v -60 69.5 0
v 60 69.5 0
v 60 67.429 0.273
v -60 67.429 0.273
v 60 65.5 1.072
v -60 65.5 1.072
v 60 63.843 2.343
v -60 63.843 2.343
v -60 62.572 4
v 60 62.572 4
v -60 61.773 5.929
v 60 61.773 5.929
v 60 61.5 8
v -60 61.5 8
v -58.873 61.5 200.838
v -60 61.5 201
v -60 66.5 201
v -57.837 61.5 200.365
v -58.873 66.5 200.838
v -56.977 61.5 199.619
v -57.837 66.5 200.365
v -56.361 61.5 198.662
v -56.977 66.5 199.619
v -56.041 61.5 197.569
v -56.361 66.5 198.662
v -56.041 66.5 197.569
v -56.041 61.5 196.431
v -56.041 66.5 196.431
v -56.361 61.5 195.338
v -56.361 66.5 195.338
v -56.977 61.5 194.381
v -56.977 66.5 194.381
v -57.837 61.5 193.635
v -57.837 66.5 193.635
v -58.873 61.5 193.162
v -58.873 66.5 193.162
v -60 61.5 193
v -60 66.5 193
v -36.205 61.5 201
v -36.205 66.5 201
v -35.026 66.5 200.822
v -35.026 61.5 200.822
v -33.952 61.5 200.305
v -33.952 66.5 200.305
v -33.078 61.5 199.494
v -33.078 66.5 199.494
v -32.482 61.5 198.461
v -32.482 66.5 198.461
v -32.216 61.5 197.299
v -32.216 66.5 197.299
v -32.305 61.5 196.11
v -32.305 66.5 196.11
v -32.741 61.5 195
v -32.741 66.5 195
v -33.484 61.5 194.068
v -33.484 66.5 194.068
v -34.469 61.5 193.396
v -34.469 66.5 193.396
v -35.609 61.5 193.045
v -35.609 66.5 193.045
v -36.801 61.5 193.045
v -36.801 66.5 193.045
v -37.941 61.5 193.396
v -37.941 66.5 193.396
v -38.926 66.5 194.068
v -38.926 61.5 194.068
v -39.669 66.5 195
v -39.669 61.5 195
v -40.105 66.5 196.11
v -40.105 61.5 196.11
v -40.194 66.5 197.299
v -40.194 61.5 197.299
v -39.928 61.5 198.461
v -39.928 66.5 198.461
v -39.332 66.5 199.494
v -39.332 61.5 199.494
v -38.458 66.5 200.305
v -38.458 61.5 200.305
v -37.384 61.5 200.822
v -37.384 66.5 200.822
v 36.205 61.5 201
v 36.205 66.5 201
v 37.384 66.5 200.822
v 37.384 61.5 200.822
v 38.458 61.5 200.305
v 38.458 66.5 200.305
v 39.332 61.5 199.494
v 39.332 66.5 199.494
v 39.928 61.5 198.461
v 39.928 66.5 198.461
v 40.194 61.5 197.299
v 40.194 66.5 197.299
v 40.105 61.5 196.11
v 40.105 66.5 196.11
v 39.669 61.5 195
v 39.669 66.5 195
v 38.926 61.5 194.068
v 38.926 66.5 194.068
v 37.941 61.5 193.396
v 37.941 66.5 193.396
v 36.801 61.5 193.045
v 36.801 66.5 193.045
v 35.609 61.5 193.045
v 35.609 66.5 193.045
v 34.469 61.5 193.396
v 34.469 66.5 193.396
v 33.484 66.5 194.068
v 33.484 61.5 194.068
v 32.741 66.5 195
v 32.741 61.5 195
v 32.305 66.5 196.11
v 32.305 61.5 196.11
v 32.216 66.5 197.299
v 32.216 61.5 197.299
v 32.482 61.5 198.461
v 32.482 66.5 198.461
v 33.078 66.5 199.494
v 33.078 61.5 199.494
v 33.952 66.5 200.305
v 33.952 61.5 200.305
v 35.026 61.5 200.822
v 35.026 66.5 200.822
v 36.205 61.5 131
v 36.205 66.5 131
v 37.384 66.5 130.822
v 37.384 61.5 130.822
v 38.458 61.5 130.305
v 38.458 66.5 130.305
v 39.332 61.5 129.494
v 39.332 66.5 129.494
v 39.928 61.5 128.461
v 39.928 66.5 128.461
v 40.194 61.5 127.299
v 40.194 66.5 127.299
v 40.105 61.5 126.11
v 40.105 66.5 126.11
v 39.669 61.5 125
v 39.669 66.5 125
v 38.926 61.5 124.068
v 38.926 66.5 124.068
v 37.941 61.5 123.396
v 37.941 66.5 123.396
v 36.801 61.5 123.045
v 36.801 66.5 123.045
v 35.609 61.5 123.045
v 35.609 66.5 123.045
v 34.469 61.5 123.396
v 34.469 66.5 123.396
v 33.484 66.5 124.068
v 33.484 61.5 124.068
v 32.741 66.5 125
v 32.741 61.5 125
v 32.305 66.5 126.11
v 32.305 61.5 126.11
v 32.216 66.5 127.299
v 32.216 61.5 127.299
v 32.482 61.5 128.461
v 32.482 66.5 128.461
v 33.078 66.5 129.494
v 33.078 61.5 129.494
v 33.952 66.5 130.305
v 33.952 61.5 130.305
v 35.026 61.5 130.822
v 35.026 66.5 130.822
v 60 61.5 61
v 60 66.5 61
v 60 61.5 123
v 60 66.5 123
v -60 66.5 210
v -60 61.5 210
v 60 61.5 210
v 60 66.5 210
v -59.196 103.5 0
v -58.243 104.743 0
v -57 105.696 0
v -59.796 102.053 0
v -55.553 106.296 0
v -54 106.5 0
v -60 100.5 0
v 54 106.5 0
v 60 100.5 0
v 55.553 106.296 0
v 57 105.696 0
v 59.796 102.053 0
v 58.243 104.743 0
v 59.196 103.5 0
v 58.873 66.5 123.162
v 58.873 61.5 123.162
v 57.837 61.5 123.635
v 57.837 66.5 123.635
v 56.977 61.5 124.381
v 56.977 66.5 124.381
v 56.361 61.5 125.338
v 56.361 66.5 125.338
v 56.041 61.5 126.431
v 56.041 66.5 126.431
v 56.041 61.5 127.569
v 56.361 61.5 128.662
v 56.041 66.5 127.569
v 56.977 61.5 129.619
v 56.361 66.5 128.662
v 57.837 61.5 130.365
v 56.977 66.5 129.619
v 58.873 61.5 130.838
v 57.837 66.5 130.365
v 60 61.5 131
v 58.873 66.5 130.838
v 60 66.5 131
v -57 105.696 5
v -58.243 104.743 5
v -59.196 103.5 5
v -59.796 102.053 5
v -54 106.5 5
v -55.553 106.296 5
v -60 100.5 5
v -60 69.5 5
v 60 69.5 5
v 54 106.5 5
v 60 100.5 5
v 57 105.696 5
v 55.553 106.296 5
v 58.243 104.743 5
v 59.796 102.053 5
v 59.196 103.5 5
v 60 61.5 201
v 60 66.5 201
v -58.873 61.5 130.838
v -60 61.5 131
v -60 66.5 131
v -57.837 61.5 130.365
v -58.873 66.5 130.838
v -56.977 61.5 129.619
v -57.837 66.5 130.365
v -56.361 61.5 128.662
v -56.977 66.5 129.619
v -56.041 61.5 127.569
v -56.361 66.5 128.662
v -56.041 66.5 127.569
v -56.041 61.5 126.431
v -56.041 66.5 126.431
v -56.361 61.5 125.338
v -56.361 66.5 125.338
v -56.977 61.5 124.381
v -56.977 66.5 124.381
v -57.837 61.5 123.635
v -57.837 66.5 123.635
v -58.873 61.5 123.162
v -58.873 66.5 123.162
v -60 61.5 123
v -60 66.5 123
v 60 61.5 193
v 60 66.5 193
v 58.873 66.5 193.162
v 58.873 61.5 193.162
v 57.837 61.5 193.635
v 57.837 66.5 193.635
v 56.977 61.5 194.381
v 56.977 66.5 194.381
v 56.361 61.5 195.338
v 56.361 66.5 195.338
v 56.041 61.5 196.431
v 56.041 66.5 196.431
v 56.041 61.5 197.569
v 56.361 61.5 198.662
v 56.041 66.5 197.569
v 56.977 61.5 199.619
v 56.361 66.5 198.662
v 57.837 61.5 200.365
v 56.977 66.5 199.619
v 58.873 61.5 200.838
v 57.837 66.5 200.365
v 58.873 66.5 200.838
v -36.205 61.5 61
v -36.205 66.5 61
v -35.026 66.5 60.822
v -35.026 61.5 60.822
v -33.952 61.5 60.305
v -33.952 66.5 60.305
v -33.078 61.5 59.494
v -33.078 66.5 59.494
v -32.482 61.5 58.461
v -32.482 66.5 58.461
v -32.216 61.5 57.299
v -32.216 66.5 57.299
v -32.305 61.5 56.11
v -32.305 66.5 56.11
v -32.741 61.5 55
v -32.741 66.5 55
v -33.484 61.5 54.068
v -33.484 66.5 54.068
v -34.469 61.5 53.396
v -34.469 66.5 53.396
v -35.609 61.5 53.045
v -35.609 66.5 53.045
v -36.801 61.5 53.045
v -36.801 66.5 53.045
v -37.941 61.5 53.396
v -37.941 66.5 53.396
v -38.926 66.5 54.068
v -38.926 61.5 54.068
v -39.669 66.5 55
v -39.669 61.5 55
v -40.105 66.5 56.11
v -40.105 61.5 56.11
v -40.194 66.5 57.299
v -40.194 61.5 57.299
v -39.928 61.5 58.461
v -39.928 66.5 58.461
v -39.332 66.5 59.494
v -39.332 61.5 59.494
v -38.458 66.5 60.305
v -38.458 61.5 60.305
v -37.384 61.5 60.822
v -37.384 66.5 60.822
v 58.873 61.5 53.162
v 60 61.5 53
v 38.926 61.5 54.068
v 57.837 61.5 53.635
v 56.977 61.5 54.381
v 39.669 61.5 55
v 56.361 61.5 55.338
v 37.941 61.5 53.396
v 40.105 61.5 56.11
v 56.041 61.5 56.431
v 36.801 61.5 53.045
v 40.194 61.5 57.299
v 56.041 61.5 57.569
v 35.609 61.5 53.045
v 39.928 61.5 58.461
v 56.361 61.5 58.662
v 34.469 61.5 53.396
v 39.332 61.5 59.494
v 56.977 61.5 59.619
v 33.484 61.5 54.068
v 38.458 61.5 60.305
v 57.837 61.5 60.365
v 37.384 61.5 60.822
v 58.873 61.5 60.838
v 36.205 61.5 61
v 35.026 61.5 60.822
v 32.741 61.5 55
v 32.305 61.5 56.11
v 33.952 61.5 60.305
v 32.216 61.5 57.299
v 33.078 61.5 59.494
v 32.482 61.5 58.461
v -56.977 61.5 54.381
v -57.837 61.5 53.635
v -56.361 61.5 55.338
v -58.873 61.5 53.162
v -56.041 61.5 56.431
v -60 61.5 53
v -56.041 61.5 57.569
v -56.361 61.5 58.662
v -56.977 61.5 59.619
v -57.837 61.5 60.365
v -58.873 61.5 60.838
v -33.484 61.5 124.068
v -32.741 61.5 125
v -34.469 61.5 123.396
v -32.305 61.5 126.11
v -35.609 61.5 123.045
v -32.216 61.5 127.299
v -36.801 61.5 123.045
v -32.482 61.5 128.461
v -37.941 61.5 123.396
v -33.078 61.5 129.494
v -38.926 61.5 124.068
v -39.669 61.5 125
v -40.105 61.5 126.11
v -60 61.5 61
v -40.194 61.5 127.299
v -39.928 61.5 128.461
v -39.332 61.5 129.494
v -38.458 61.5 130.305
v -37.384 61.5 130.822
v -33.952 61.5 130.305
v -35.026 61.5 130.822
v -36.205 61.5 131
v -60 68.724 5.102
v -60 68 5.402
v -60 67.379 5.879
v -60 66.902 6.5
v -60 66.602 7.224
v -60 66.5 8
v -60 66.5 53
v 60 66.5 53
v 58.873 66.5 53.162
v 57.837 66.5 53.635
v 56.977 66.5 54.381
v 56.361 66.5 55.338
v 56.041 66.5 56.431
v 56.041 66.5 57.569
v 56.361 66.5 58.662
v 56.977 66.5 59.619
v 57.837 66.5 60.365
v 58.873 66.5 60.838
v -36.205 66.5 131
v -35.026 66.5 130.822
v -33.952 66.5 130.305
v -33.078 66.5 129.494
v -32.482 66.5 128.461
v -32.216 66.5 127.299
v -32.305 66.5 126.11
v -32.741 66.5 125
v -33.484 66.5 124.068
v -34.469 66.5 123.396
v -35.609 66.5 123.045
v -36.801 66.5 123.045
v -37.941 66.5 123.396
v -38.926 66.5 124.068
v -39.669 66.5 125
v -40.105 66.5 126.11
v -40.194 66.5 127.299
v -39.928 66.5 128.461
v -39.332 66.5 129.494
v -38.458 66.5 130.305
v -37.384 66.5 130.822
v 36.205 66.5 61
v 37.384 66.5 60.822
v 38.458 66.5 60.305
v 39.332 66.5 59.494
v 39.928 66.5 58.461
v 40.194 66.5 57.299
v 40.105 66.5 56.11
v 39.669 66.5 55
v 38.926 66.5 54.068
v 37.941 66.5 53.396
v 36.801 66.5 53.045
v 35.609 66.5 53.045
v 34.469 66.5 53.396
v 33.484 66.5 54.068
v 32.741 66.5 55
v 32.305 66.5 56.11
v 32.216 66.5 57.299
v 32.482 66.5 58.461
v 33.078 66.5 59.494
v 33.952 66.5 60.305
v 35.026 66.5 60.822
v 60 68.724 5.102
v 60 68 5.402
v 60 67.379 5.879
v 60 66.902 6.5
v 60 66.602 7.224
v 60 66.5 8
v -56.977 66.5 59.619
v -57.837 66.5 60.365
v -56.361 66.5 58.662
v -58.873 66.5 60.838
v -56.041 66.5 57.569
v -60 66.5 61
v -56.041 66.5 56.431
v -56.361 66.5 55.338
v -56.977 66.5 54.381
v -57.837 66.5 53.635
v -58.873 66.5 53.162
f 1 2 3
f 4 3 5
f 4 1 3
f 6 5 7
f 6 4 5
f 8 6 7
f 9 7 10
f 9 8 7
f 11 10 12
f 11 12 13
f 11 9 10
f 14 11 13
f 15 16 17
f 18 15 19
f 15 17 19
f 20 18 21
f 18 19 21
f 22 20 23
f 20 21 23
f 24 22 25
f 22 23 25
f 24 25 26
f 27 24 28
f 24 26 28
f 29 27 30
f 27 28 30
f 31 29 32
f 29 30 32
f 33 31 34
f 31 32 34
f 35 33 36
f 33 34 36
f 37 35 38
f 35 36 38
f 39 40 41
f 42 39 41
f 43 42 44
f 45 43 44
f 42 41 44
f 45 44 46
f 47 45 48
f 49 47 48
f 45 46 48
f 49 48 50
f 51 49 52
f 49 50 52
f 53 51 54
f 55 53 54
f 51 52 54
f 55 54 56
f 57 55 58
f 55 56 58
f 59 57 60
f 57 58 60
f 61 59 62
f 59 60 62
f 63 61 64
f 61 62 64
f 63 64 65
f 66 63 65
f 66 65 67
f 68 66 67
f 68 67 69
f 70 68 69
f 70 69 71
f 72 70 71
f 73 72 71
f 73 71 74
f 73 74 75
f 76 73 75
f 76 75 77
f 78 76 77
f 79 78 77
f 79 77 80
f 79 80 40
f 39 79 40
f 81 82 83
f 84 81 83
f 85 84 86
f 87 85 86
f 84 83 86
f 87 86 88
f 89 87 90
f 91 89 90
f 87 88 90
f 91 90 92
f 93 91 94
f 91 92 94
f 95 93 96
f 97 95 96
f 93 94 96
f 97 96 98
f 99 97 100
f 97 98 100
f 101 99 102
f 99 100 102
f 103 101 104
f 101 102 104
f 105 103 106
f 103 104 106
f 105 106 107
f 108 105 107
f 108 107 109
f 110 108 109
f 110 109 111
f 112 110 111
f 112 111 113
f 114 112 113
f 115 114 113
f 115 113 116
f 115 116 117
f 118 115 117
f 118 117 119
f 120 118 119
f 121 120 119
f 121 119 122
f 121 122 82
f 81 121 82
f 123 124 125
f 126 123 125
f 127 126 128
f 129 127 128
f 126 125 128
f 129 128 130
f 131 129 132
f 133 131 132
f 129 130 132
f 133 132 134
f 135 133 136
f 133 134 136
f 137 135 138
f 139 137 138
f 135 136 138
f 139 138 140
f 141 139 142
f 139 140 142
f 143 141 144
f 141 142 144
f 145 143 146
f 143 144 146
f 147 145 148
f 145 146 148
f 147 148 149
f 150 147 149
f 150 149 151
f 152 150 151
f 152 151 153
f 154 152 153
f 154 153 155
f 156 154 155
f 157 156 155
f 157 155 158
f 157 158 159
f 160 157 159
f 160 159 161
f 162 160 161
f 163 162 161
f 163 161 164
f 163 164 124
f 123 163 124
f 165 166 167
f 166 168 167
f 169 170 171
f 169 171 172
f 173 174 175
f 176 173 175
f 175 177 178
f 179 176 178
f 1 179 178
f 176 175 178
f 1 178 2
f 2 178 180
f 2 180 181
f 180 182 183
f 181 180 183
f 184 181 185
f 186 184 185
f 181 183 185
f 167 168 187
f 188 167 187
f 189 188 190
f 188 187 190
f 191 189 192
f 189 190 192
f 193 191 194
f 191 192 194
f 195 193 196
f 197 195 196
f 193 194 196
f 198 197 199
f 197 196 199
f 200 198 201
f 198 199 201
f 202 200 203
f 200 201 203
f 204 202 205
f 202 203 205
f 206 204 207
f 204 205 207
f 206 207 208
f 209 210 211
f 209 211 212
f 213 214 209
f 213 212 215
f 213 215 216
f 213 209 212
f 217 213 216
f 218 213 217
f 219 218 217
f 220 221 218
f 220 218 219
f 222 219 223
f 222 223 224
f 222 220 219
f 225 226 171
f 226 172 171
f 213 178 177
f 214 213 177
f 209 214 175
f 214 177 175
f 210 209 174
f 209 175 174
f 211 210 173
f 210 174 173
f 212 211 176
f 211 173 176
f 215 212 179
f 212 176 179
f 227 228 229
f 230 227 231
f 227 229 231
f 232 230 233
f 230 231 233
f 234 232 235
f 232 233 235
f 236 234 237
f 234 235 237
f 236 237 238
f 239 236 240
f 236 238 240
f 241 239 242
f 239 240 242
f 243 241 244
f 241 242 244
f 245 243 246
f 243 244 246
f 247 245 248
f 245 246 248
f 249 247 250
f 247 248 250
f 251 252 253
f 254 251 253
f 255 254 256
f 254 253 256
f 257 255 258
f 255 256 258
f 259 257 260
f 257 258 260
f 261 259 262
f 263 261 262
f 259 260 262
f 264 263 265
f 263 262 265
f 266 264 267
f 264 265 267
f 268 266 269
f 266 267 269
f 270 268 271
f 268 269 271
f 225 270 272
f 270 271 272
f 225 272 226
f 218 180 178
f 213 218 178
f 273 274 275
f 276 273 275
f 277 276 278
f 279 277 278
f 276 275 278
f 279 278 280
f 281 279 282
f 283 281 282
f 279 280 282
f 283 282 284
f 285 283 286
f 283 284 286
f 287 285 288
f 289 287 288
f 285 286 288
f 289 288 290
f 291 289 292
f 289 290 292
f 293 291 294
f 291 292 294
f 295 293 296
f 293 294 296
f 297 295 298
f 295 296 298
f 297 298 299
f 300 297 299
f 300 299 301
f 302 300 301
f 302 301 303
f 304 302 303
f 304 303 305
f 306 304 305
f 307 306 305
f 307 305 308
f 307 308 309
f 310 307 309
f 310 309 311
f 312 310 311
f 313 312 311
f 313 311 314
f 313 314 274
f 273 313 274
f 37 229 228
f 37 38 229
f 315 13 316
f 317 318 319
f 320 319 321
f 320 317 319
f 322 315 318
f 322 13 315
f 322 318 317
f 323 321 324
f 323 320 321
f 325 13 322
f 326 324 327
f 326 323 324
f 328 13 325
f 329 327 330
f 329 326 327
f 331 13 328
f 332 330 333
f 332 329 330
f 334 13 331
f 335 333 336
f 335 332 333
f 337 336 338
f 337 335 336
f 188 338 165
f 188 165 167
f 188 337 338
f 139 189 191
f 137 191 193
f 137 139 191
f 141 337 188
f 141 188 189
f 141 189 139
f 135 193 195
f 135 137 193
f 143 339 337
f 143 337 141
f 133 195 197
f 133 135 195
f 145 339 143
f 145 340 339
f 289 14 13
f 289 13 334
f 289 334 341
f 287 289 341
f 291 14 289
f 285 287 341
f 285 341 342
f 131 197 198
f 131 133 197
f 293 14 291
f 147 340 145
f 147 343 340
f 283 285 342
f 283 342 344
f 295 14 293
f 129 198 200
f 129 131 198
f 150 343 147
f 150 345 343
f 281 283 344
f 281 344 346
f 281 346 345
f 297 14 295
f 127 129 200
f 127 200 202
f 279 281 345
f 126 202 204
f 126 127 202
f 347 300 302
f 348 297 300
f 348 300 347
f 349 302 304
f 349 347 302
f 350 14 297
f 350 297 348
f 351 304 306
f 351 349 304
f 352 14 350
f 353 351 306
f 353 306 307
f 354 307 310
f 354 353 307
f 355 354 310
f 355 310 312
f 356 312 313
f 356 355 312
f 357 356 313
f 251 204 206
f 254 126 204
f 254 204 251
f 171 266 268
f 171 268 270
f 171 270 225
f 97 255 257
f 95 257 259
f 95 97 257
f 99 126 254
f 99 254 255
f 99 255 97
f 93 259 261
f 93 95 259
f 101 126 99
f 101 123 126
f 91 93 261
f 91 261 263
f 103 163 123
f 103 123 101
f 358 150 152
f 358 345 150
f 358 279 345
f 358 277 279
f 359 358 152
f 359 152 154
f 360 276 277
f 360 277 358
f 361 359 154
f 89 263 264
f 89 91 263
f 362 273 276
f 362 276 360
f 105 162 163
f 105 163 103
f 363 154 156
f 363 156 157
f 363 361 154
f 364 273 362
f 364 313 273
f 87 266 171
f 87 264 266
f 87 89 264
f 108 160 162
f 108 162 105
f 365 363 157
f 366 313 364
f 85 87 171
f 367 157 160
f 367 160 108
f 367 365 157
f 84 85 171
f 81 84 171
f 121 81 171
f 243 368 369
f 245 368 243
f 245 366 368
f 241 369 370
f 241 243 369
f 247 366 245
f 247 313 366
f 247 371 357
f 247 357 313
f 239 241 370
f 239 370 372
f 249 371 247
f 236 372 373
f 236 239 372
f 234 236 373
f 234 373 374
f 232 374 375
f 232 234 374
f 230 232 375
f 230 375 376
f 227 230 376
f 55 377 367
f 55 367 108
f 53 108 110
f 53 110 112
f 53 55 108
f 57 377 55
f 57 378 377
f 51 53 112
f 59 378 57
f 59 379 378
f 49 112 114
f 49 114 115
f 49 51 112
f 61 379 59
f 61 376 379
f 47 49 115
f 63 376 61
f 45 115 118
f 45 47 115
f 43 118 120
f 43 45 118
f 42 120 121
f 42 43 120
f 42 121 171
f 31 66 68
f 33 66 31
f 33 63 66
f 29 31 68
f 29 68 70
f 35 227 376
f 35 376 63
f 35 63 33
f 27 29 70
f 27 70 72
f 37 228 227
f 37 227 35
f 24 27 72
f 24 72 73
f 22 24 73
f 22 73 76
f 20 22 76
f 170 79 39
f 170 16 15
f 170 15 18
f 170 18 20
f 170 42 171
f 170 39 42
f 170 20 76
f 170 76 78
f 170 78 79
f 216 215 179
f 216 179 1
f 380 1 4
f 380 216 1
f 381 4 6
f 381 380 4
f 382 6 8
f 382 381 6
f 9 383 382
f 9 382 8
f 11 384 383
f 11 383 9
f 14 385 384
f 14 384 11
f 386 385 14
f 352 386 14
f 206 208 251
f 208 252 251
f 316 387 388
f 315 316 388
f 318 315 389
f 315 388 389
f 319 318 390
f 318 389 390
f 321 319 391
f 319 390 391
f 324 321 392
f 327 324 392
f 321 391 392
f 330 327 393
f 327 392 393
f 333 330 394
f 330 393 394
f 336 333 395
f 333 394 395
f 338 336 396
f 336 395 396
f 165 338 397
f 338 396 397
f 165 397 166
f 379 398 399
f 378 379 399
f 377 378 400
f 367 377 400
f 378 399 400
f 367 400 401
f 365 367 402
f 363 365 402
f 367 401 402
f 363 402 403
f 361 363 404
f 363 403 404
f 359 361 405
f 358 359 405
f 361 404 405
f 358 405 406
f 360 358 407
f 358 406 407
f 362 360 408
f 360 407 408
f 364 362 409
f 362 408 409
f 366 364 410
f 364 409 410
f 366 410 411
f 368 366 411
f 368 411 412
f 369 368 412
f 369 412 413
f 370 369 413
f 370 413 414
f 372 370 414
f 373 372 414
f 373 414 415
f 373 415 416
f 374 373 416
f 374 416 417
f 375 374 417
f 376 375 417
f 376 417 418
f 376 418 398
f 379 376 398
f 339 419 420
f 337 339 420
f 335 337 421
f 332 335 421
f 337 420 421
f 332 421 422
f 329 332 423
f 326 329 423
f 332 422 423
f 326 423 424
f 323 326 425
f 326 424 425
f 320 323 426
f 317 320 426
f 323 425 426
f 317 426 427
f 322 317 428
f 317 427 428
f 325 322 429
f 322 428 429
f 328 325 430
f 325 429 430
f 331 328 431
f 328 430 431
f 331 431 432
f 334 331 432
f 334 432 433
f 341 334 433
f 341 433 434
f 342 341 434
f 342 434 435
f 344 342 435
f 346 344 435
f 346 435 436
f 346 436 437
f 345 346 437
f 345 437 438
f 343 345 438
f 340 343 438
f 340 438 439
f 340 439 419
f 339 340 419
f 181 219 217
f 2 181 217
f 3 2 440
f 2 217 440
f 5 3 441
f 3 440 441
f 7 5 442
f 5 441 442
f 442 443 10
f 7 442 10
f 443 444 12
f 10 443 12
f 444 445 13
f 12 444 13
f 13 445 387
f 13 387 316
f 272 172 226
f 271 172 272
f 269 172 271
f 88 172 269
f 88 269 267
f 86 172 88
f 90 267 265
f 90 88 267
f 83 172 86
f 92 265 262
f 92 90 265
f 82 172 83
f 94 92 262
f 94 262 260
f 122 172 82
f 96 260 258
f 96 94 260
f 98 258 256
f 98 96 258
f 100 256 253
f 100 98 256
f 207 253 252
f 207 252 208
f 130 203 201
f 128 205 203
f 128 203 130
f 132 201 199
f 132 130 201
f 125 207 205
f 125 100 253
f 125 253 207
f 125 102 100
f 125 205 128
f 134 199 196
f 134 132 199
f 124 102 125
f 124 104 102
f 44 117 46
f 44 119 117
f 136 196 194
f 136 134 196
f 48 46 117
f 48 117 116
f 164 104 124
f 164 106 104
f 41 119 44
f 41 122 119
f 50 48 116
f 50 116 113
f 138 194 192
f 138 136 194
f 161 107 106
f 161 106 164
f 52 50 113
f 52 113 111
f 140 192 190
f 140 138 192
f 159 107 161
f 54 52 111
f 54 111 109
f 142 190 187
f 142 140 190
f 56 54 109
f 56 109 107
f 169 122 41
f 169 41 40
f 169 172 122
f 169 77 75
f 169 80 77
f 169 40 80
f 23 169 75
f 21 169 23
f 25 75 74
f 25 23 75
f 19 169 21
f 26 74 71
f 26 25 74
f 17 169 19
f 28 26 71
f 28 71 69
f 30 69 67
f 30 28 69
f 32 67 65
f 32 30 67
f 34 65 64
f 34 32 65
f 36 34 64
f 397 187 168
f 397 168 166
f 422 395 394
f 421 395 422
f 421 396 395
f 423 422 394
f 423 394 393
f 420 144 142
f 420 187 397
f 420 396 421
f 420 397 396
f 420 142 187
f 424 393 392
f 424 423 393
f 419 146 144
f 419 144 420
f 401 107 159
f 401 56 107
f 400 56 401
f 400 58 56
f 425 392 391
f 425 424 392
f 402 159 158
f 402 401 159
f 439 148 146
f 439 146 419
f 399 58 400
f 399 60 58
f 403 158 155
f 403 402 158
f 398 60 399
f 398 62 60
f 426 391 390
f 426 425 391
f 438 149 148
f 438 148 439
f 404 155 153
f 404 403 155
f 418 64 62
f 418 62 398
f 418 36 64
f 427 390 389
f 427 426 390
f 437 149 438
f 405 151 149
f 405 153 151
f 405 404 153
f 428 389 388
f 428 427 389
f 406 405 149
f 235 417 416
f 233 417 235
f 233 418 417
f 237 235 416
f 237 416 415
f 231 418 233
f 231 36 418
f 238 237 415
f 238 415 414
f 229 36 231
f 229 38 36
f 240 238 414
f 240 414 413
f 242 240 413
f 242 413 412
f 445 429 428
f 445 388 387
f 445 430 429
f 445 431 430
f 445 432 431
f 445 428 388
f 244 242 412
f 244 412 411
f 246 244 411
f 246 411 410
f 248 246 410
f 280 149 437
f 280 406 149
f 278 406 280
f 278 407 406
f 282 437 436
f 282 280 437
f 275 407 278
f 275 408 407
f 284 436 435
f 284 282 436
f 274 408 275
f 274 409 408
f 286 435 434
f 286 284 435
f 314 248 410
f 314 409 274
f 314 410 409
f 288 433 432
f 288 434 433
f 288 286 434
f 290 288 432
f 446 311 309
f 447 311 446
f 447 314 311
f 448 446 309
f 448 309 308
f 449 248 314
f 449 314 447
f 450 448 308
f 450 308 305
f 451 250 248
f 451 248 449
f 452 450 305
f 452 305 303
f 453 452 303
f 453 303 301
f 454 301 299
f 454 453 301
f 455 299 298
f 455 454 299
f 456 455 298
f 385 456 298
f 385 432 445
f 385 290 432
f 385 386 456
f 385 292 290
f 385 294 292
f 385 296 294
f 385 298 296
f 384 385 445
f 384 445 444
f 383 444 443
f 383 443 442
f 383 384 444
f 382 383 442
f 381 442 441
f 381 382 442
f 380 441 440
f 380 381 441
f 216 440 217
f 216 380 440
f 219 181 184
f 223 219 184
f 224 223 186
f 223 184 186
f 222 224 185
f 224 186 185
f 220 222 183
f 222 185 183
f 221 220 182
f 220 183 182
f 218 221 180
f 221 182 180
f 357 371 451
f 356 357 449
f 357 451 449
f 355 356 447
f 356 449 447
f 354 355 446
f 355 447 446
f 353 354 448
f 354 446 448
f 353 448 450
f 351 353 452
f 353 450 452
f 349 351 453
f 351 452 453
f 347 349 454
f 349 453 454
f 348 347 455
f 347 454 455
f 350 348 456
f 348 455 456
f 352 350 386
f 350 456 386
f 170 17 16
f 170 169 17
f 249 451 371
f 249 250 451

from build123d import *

# Parameters (mm, degrees)
BASE_FLANGE2_DEPTH           = 5
EDGE_FLANGE3_STRIP_W         = 26
EDGE_FLANGE3_STRIP_H         = 5
EDGE_FLANGE3_STRIP_CUT_DEPTH = 120
EDGE_FLANGE3_DEPTH           = 120
SKETCH18_R                   = 4
CUT_EXTRUDE1_DEPTH           = 10


# Sheet-metal steps are written as plain solids
with BuildPart() as part:
    # Sketch1 → Base-Flange2 (new body)
    with BuildSketch(Plane.XY):
        with BuildLine():
            Line((60, 66.5), (60, 100.5))
            ThreePointArc((60, 100.5), (58.242640687, 104.742640687), (54, 106.5))
            Line((54, 106.5), (-54, 106.5))
            ThreePointArc((-54, 106.5), (-58.242640687, 104.742640687), (-60, 100.5))
            Line((-60, 100.5), (-60, 66.5))
            Line((-60, 66.5), (60, 66.5))
        make_face()
    extrude(amount=BASE_FLANGE2_DEPTH)

    # Edge-Flange3 strip (across the edge) → Edge-Flange3 strip cut (cut)
    with BuildSketch(Plane(origin=(-60, 66.5, 5), x_dir=(0, 1, 0), z_dir=(1, 0, 0))):
        with Locations((-10, -2.5)):
            Rectangle(EDGE_FLANGE3_STRIP_W, EDGE_FLANGE3_STRIP_H)
    extrude(amount=EDGE_FLANGE3_STRIP_CUT_DEPTH, mode=Mode.SUBTRACT)

    # Edge-Flange3 section (across the edge) → Edge-Flange3 (add)
    with BuildSketch(Plane(origin=(-60, 66.5, 5), x_dir=(0, 1, 0), z_dir=(1, 0, 0))):
        with BuildLine():
            Line((-5, 3), (-5, 205))
            Line((-5, 205), (0, 205))
            Line((0, 205), (0, 3))
            ThreePointArc((0, 3), (0.878679656, 0.878679656), (3, 0))
            Line((3, 0), (3, -5))
            ThreePointArc((3, -5), (-2.656854249, -2.656854249), (-5, 3))
        make_face()
    extrude(amount=EDGE_FLANGE3_DEPTH)

    # Sketch18 → Cut-Extrude1 (cut)
    with BuildSketch(Plane(origin=(0, 66.5, 0), x_dir=(1, 0, 0), z_dir=(0, 1, 0))):
        with Locations(Location((36.205, -197, 0), (0, 0, 270))):
            Circle(SKETCH18_R)
        with Locations(Location((-36.205, -197, 0), (0, 0, 270))):
            Circle(SKETCH18_R)
        with Locations(Location((-36.205, -127, 0), (0, 0, 270))):
            Circle(SKETCH18_R)
        with Locations(Location((36.205, -127, 0), (0, 0, 270))):
            Circle(SKETCH18_R)
        with Locations(Location((36.205, -57, 0), (0, 0, 270))):
            Circle(SKETCH18_R)
        with Locations(Location((-36.205, -57, 0), (0, 0, 270))):
            Circle(SKETCH18_R)
        with Locations((-60, -197)):
            Circle(SKETCH18_R)
        with Locations((-60, -127)):
            Circle(SKETCH18_R)
        with Locations((-60, -57)):
            Circle(SKETCH18_R)
        with Locations((60, -197)):
            Circle(SKETCH18_R)
        with Locations((60, -127)):
            Circle(SKETCH18_R)
        with Locations((60, -57)):
            Circle(SKETCH18_R)
    extrude(amount=-CUT_EXTRUDE1_DEPTH, mode=Mode.SUBTRACT)


solid = part.part
